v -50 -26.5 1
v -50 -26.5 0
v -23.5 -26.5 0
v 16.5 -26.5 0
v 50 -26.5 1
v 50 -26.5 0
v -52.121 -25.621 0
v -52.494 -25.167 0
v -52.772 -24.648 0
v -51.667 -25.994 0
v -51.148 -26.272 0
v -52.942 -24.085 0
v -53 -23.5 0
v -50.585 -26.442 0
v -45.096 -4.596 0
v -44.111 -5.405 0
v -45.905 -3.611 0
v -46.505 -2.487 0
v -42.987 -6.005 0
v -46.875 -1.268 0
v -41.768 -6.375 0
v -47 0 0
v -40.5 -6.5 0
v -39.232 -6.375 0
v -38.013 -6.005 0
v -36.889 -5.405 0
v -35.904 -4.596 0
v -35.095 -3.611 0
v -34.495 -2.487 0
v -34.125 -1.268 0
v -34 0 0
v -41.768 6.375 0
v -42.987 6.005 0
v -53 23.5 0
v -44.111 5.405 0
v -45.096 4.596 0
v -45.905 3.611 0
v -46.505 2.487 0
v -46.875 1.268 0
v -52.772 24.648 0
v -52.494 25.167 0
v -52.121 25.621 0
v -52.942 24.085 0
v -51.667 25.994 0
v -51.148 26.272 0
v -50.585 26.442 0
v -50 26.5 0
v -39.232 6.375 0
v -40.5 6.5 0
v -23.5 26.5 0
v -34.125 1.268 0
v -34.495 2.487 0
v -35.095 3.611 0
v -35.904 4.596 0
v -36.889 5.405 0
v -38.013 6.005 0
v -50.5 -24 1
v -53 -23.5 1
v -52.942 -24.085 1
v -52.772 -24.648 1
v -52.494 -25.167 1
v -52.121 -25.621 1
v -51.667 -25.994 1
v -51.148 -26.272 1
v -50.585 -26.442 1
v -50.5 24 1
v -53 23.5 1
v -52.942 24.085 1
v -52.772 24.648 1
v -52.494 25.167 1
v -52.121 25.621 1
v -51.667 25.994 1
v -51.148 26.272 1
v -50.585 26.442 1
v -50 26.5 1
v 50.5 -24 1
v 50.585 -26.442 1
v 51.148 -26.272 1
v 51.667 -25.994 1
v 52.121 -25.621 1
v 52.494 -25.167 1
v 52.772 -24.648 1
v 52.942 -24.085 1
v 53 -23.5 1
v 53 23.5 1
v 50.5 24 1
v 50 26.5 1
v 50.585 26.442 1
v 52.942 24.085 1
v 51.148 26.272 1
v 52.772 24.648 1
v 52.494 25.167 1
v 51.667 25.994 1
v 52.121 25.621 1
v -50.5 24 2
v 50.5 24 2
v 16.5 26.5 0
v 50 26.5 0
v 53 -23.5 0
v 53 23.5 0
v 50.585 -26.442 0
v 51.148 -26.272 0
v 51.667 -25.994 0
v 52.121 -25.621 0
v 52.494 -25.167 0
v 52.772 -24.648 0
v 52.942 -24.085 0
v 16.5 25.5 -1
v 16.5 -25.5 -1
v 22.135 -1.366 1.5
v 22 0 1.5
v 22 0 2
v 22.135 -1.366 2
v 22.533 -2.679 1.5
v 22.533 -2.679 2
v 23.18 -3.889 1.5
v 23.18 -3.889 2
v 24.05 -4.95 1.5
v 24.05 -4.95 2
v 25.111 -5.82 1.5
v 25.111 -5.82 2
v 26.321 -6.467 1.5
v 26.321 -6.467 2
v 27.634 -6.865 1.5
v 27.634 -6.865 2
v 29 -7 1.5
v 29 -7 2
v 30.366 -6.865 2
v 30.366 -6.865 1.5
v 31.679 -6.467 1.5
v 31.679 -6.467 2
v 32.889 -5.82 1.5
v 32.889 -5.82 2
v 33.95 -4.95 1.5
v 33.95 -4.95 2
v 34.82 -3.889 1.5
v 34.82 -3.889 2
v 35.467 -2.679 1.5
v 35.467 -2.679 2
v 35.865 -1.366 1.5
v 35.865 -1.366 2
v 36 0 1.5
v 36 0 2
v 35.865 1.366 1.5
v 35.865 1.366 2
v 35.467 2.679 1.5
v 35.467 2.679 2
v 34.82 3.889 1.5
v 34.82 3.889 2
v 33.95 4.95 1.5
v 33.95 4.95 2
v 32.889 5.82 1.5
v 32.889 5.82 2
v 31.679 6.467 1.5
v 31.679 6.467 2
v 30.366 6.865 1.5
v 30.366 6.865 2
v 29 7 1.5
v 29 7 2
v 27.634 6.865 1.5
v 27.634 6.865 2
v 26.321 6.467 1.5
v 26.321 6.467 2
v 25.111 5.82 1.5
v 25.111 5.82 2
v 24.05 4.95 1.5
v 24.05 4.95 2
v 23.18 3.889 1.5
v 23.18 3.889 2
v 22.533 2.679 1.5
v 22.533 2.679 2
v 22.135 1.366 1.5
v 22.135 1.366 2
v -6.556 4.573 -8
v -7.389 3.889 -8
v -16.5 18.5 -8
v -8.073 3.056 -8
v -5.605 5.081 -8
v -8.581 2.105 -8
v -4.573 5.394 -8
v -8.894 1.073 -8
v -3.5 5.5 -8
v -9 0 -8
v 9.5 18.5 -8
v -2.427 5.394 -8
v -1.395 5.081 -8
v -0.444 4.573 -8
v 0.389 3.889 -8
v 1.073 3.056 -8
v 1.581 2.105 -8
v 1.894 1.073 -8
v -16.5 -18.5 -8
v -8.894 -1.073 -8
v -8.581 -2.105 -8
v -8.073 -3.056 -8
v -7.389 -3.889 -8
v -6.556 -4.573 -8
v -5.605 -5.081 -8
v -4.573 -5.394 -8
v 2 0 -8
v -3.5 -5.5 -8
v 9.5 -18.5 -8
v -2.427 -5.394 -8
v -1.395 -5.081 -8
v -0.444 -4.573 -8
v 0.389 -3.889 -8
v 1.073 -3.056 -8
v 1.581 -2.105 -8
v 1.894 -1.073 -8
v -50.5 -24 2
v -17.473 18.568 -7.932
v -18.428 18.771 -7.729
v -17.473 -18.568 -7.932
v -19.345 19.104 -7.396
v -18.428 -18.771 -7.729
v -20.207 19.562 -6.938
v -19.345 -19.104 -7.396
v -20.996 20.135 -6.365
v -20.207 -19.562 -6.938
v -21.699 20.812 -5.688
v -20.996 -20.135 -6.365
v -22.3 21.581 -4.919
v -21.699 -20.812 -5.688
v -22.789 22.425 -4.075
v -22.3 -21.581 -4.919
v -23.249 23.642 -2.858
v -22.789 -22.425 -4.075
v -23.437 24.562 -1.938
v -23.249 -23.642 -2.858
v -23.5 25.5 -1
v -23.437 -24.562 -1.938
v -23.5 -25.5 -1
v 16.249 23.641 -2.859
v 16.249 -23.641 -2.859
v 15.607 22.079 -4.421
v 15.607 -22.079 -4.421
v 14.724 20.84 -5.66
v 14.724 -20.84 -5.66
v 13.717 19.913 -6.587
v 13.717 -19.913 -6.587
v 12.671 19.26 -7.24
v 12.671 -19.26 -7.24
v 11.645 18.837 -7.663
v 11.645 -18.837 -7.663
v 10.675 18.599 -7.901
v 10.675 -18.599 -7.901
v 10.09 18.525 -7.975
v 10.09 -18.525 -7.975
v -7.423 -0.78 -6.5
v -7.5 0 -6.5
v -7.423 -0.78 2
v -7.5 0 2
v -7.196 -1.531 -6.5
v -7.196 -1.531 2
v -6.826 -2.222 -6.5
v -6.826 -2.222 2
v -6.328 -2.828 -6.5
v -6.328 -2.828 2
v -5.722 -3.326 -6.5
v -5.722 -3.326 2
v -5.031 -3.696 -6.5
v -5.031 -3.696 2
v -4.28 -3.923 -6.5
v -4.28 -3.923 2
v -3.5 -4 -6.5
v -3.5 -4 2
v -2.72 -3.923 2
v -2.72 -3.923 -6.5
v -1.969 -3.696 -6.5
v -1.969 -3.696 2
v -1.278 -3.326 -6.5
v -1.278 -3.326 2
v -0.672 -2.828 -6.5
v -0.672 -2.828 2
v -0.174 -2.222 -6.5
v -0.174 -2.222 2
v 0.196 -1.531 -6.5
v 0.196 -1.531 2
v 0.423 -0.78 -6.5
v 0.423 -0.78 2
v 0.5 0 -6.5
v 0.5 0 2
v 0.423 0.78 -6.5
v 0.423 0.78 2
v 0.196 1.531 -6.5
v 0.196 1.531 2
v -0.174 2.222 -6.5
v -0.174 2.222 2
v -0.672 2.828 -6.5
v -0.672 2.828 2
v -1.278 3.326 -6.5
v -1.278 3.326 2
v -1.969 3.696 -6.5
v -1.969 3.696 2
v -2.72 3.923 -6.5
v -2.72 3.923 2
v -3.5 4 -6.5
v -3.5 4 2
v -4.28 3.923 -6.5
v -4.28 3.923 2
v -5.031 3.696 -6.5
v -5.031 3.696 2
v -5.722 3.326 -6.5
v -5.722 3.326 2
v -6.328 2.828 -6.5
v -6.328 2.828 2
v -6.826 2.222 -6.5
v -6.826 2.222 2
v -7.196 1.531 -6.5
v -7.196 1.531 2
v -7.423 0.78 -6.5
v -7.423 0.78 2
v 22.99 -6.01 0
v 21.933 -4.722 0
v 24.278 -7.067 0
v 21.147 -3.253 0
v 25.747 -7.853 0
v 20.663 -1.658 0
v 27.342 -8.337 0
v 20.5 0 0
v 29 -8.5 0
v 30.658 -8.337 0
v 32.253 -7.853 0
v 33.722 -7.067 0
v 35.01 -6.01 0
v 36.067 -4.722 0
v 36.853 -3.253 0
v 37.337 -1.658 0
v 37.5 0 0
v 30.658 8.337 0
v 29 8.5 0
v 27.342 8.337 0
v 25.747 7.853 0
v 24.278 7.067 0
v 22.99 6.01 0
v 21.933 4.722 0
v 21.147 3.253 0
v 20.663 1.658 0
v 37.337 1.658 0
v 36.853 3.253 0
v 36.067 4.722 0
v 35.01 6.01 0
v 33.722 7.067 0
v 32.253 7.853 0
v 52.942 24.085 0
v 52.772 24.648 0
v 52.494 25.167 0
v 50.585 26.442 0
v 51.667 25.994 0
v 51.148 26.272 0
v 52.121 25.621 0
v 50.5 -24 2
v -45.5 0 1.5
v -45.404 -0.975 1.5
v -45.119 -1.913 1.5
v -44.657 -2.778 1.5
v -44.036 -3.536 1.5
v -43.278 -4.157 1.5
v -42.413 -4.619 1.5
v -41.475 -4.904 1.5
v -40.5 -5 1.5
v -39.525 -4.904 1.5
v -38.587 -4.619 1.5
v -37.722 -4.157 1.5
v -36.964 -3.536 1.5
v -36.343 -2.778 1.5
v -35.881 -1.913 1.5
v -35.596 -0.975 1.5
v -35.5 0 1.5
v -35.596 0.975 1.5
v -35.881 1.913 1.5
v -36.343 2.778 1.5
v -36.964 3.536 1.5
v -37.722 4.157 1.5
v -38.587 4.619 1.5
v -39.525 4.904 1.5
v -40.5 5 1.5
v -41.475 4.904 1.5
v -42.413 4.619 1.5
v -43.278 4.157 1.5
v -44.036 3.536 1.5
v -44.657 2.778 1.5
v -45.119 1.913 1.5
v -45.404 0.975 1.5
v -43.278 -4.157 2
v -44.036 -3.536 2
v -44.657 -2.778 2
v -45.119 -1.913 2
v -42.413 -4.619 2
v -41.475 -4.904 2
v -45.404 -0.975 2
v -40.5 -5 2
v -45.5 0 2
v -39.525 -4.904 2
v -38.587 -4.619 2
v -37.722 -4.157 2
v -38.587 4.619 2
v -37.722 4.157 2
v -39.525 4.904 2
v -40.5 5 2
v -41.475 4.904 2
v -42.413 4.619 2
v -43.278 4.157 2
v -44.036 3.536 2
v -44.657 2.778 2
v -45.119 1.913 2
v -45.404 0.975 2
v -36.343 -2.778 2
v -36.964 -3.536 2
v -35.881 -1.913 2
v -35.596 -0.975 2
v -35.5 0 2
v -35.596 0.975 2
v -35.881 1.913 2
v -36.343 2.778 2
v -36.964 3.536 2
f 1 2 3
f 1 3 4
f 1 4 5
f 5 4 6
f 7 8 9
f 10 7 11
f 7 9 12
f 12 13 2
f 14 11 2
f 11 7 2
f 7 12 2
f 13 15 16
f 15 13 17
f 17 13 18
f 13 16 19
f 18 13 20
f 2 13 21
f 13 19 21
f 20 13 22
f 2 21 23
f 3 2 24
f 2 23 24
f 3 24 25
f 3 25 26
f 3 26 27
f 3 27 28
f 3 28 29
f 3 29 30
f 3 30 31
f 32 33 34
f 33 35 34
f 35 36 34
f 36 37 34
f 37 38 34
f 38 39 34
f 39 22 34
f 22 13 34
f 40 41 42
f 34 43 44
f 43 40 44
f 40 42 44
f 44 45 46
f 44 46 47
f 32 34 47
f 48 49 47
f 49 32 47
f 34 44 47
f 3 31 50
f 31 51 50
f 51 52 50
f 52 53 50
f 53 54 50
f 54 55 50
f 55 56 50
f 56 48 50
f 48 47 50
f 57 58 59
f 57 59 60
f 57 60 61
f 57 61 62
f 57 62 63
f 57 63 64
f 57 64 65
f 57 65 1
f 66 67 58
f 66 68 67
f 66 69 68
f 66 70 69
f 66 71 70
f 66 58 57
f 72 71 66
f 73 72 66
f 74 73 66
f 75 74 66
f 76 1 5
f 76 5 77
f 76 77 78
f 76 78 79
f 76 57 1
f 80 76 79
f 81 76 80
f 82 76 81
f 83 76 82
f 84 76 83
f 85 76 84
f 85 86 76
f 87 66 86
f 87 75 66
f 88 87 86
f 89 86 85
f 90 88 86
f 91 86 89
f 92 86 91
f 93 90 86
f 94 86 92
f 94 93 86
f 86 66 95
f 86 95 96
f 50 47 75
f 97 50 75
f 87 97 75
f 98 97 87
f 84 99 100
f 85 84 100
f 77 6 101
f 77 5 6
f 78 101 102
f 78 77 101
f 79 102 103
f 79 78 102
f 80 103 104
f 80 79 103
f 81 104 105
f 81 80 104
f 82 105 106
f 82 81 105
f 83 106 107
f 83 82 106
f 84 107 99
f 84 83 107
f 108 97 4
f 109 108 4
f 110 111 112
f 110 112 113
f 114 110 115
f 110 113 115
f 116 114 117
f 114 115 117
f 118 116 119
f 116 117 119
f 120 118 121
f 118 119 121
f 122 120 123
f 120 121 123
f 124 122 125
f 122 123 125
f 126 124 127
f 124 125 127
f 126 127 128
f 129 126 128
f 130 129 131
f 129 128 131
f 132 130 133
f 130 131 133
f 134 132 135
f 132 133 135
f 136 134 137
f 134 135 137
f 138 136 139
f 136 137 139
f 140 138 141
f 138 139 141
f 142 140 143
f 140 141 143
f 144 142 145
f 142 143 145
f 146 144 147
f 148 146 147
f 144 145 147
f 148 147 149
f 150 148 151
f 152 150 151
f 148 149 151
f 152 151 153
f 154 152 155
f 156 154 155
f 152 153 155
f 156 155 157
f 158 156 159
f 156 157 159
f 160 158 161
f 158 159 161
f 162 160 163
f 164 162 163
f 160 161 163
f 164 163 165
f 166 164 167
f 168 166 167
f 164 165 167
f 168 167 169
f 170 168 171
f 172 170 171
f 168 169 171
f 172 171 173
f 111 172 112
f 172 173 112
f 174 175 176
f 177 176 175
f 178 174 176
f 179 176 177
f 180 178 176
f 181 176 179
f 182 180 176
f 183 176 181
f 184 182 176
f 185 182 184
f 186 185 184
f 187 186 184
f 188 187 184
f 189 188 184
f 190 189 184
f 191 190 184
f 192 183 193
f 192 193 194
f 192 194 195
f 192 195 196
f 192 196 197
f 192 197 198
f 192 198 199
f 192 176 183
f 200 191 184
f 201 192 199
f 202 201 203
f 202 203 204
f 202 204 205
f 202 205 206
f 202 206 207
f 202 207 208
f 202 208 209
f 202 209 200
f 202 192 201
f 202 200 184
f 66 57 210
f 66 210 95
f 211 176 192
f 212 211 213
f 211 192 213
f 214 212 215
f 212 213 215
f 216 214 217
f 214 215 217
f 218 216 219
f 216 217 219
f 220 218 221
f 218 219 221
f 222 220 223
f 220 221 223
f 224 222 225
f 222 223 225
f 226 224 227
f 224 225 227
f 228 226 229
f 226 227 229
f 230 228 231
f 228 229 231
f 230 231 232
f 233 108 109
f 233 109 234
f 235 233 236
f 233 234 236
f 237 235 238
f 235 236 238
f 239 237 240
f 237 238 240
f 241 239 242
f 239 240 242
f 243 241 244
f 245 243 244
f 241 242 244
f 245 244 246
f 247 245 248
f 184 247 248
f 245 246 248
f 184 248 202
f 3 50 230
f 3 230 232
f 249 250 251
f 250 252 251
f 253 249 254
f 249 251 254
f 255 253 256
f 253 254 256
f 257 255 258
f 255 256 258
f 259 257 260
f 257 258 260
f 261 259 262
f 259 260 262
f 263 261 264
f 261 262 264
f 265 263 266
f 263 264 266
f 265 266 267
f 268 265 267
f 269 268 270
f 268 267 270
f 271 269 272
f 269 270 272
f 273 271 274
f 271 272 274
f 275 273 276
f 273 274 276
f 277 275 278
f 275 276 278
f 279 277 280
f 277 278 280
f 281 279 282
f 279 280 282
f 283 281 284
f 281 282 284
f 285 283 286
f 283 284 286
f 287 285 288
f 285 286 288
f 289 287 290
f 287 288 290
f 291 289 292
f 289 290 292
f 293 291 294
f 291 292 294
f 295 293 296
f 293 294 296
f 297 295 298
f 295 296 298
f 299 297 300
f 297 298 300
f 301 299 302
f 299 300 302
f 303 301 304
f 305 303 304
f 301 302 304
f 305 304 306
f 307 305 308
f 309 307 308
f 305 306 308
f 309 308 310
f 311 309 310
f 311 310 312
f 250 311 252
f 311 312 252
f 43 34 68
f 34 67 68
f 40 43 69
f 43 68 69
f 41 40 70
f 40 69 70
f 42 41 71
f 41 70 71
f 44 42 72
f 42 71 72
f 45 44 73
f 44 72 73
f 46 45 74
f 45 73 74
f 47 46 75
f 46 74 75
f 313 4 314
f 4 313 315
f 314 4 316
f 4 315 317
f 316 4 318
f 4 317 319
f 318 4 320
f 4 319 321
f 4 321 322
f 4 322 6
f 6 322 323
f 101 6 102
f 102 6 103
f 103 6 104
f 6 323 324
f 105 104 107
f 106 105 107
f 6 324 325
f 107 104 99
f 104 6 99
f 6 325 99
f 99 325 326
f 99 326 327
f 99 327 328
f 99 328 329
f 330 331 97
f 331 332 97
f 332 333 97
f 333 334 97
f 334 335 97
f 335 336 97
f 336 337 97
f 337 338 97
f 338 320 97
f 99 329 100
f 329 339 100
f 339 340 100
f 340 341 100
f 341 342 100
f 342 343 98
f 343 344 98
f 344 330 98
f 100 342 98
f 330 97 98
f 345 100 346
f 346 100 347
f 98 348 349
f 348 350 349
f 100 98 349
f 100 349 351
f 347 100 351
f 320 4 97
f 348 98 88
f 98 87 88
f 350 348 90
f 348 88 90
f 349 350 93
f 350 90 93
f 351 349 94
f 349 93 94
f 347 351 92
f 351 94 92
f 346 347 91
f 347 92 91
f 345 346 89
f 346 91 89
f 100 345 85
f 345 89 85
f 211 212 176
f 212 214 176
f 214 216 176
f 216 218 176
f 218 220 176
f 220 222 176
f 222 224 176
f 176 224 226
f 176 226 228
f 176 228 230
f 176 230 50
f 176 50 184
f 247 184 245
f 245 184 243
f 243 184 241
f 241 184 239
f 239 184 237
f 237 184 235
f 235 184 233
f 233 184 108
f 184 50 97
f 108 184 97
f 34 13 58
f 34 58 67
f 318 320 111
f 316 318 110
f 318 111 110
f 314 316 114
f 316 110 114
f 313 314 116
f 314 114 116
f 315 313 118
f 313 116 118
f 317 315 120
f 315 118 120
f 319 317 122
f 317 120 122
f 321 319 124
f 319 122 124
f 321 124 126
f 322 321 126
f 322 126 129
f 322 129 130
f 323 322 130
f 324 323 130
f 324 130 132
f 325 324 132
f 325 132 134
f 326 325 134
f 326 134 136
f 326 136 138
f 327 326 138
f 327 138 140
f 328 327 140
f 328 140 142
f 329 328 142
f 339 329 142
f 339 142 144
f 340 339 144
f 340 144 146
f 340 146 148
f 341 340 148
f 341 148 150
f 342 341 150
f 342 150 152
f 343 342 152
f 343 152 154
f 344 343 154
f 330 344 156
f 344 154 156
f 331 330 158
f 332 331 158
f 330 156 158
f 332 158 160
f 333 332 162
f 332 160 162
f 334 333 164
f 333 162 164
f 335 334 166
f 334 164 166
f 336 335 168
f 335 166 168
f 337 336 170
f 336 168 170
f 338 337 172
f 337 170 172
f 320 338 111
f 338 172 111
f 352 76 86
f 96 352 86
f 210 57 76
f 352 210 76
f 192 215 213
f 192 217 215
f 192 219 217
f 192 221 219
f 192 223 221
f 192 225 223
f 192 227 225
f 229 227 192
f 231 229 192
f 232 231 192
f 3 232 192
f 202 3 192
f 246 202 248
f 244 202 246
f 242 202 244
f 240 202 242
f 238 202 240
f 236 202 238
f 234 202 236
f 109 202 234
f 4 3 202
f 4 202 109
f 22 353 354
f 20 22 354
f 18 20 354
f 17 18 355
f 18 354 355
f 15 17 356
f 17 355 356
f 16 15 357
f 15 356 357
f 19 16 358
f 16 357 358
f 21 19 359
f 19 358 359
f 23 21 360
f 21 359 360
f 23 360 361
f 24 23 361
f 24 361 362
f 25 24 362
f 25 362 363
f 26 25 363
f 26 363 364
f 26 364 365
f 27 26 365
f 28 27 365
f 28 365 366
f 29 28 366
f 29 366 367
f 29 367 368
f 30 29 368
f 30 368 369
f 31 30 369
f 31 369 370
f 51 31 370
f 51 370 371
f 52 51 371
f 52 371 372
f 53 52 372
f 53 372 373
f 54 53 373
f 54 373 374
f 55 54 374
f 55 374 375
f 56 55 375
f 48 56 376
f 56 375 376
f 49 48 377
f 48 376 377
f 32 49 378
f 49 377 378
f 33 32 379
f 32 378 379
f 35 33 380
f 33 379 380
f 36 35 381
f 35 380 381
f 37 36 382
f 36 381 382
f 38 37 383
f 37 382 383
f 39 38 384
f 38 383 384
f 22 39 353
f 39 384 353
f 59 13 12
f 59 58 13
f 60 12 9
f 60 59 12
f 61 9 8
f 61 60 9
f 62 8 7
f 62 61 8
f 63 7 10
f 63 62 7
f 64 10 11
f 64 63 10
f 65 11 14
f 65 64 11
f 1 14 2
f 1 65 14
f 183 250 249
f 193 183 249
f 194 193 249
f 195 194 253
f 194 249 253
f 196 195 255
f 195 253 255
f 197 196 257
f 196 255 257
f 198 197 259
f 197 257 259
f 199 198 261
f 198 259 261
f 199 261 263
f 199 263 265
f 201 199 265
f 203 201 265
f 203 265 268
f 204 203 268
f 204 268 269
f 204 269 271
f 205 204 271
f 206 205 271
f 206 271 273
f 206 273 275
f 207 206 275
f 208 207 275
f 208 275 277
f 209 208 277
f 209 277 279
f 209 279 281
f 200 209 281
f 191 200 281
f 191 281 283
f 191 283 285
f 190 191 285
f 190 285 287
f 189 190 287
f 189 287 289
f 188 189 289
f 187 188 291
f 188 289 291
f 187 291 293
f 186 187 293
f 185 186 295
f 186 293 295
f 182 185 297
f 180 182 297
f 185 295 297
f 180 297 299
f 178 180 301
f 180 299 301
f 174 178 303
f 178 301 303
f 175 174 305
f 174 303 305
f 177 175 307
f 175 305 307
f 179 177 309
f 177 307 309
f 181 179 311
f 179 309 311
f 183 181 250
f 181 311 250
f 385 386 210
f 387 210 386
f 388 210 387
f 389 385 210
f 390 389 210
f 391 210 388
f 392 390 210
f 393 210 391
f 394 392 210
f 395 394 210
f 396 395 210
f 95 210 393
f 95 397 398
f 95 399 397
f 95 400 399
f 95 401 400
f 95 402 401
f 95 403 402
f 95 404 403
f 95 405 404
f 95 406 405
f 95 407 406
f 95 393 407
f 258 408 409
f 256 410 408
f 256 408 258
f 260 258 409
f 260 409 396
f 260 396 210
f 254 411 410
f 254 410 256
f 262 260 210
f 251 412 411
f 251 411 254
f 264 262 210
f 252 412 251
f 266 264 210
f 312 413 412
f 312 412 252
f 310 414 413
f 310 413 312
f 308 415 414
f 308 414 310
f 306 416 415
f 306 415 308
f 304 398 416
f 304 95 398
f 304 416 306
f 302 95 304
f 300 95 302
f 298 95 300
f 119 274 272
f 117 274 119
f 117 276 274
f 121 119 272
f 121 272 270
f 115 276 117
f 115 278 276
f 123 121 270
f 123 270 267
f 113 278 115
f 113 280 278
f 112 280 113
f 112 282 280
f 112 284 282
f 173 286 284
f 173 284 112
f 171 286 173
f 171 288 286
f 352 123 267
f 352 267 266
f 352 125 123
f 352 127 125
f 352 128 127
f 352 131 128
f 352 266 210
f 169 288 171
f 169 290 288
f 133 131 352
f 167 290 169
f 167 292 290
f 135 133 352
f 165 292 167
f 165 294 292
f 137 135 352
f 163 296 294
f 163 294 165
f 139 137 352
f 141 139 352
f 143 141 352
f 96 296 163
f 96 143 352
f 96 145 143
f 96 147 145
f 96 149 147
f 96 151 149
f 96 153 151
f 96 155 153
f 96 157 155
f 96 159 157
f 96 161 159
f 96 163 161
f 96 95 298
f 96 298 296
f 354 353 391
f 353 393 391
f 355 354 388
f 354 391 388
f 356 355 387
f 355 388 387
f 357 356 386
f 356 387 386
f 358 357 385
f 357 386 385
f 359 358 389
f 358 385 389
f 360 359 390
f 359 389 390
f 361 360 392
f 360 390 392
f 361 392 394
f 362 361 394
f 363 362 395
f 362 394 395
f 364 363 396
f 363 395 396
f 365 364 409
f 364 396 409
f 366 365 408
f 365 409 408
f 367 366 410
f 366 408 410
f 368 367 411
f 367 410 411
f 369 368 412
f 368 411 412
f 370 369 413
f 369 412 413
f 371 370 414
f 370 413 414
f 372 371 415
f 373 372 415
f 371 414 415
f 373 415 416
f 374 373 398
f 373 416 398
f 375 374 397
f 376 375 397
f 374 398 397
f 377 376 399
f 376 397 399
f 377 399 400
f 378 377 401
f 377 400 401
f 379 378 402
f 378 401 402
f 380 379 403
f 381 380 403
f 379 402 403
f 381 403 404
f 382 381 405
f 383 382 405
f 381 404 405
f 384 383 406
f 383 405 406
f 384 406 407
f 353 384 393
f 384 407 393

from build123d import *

# Parameters (mm, degrees)
F0_W            = 106
F0_H            = 53
F1_DEPTH        = 1
F2_W            = 101
F2_H            = 48
F3_DEPTH        = 1
F4_R            = 3
F6_D            = 14
F6_CSINK_D      = 17
F6_CSINK_ANGLE  = 90
F7_D            = 10
F7_CSINK_D      = 13
F7_CSINK_ANGLE  = 90
F8_W            = 40
F8_H            = 53
F9_DEPTH        = 8
F11_D           = 8
F11_CSINK_D     = 11
F11_CSINK_ANGLE = 90
F12_SIZE        = 8
F13_R           = 7


with BuildPart() as f1:
    # F0 (on Top) → F1 (new body)
    with BuildSketch(Plane.XY):
        Rectangle(F0_W, F0_H)
    extrude(amount=F1_DEPTH)

    # F2 (on face) → F3 (join)
    with BuildSketch(Plane.XY.offset(1)):
        Rectangle(F2_W, F2_H)
    extrude(amount=F3_DEPTH)

    # F4
    f4_edges = [f1.edges().sort_by_distance(p)[0] for p in [
        (-53, -26.5, 0.5),
        (53, -26.5, 0.5),
        (53, 26.5, 0.5),
        (-53, 26.5, 0.5),
    ]]
    fillet(f4_edges, radius=F4_R)

    # F6 (through all)
    with Locations(Plane(origin=(0, 0, 0), x_dir=(1, 0, 0), z_dir=(0, 0, -1))):
        with Locations((29, 0)):
            CounterSinkHole(F6_D / 2, F6_CSINK_D / 2, counter_sink_angle=F6_CSINK_ANGLE)

    # F7 (through all)
    with Locations(Plane(origin=(0, 0, 0), x_dir=(1, 0, 0), z_dir=(0, 0, -1))):
        with Locations((-40.5, 0)):
            CounterSinkHole(F7_D / 2, F7_CSINK_D / 2, counter_sink_angle=F7_CSINK_ANGLE)

    # F8 (on face) → F9 (join)
    with BuildSketch(Plane(origin=(0, 0, 0), x_dir=(1, 0, 0), z_dir=(0, 0, -1))):
        with Locations((-3.5, 0)):
            Rectangle(F8_W, F8_H)
    extrude(amount=F9_DEPTH)

    # F11 (through all)
    with Locations(Plane(origin=(0, 0, -8), x_dir=(1, 0, 0), z_dir=(0, 0, -1))):
        with Locations((-3.5, 0)):
            CounterSinkHole(F11_D / 2, F11_CSINK_D / 2, counter_sink_angle=F11_CSINK_ANGLE)

    # F12
    f12_edges = [f1.edges().sort_by_distance(p)[0] for p in [
        (-3.5, 26.5, -8),
        (-3.5, -26.5, -8),
    ]]
    chamfer(f12_edges, length=F12_SIZE)

    # F13
    f13_edges = [f1.edges().sort_by_distance(p)[0] for p in [
        (-23.5, 0, -8),
        (16.5, 0, -8),
    ]]
    fillet(f13_edges, radius=F13_R)


solid = f1.part
